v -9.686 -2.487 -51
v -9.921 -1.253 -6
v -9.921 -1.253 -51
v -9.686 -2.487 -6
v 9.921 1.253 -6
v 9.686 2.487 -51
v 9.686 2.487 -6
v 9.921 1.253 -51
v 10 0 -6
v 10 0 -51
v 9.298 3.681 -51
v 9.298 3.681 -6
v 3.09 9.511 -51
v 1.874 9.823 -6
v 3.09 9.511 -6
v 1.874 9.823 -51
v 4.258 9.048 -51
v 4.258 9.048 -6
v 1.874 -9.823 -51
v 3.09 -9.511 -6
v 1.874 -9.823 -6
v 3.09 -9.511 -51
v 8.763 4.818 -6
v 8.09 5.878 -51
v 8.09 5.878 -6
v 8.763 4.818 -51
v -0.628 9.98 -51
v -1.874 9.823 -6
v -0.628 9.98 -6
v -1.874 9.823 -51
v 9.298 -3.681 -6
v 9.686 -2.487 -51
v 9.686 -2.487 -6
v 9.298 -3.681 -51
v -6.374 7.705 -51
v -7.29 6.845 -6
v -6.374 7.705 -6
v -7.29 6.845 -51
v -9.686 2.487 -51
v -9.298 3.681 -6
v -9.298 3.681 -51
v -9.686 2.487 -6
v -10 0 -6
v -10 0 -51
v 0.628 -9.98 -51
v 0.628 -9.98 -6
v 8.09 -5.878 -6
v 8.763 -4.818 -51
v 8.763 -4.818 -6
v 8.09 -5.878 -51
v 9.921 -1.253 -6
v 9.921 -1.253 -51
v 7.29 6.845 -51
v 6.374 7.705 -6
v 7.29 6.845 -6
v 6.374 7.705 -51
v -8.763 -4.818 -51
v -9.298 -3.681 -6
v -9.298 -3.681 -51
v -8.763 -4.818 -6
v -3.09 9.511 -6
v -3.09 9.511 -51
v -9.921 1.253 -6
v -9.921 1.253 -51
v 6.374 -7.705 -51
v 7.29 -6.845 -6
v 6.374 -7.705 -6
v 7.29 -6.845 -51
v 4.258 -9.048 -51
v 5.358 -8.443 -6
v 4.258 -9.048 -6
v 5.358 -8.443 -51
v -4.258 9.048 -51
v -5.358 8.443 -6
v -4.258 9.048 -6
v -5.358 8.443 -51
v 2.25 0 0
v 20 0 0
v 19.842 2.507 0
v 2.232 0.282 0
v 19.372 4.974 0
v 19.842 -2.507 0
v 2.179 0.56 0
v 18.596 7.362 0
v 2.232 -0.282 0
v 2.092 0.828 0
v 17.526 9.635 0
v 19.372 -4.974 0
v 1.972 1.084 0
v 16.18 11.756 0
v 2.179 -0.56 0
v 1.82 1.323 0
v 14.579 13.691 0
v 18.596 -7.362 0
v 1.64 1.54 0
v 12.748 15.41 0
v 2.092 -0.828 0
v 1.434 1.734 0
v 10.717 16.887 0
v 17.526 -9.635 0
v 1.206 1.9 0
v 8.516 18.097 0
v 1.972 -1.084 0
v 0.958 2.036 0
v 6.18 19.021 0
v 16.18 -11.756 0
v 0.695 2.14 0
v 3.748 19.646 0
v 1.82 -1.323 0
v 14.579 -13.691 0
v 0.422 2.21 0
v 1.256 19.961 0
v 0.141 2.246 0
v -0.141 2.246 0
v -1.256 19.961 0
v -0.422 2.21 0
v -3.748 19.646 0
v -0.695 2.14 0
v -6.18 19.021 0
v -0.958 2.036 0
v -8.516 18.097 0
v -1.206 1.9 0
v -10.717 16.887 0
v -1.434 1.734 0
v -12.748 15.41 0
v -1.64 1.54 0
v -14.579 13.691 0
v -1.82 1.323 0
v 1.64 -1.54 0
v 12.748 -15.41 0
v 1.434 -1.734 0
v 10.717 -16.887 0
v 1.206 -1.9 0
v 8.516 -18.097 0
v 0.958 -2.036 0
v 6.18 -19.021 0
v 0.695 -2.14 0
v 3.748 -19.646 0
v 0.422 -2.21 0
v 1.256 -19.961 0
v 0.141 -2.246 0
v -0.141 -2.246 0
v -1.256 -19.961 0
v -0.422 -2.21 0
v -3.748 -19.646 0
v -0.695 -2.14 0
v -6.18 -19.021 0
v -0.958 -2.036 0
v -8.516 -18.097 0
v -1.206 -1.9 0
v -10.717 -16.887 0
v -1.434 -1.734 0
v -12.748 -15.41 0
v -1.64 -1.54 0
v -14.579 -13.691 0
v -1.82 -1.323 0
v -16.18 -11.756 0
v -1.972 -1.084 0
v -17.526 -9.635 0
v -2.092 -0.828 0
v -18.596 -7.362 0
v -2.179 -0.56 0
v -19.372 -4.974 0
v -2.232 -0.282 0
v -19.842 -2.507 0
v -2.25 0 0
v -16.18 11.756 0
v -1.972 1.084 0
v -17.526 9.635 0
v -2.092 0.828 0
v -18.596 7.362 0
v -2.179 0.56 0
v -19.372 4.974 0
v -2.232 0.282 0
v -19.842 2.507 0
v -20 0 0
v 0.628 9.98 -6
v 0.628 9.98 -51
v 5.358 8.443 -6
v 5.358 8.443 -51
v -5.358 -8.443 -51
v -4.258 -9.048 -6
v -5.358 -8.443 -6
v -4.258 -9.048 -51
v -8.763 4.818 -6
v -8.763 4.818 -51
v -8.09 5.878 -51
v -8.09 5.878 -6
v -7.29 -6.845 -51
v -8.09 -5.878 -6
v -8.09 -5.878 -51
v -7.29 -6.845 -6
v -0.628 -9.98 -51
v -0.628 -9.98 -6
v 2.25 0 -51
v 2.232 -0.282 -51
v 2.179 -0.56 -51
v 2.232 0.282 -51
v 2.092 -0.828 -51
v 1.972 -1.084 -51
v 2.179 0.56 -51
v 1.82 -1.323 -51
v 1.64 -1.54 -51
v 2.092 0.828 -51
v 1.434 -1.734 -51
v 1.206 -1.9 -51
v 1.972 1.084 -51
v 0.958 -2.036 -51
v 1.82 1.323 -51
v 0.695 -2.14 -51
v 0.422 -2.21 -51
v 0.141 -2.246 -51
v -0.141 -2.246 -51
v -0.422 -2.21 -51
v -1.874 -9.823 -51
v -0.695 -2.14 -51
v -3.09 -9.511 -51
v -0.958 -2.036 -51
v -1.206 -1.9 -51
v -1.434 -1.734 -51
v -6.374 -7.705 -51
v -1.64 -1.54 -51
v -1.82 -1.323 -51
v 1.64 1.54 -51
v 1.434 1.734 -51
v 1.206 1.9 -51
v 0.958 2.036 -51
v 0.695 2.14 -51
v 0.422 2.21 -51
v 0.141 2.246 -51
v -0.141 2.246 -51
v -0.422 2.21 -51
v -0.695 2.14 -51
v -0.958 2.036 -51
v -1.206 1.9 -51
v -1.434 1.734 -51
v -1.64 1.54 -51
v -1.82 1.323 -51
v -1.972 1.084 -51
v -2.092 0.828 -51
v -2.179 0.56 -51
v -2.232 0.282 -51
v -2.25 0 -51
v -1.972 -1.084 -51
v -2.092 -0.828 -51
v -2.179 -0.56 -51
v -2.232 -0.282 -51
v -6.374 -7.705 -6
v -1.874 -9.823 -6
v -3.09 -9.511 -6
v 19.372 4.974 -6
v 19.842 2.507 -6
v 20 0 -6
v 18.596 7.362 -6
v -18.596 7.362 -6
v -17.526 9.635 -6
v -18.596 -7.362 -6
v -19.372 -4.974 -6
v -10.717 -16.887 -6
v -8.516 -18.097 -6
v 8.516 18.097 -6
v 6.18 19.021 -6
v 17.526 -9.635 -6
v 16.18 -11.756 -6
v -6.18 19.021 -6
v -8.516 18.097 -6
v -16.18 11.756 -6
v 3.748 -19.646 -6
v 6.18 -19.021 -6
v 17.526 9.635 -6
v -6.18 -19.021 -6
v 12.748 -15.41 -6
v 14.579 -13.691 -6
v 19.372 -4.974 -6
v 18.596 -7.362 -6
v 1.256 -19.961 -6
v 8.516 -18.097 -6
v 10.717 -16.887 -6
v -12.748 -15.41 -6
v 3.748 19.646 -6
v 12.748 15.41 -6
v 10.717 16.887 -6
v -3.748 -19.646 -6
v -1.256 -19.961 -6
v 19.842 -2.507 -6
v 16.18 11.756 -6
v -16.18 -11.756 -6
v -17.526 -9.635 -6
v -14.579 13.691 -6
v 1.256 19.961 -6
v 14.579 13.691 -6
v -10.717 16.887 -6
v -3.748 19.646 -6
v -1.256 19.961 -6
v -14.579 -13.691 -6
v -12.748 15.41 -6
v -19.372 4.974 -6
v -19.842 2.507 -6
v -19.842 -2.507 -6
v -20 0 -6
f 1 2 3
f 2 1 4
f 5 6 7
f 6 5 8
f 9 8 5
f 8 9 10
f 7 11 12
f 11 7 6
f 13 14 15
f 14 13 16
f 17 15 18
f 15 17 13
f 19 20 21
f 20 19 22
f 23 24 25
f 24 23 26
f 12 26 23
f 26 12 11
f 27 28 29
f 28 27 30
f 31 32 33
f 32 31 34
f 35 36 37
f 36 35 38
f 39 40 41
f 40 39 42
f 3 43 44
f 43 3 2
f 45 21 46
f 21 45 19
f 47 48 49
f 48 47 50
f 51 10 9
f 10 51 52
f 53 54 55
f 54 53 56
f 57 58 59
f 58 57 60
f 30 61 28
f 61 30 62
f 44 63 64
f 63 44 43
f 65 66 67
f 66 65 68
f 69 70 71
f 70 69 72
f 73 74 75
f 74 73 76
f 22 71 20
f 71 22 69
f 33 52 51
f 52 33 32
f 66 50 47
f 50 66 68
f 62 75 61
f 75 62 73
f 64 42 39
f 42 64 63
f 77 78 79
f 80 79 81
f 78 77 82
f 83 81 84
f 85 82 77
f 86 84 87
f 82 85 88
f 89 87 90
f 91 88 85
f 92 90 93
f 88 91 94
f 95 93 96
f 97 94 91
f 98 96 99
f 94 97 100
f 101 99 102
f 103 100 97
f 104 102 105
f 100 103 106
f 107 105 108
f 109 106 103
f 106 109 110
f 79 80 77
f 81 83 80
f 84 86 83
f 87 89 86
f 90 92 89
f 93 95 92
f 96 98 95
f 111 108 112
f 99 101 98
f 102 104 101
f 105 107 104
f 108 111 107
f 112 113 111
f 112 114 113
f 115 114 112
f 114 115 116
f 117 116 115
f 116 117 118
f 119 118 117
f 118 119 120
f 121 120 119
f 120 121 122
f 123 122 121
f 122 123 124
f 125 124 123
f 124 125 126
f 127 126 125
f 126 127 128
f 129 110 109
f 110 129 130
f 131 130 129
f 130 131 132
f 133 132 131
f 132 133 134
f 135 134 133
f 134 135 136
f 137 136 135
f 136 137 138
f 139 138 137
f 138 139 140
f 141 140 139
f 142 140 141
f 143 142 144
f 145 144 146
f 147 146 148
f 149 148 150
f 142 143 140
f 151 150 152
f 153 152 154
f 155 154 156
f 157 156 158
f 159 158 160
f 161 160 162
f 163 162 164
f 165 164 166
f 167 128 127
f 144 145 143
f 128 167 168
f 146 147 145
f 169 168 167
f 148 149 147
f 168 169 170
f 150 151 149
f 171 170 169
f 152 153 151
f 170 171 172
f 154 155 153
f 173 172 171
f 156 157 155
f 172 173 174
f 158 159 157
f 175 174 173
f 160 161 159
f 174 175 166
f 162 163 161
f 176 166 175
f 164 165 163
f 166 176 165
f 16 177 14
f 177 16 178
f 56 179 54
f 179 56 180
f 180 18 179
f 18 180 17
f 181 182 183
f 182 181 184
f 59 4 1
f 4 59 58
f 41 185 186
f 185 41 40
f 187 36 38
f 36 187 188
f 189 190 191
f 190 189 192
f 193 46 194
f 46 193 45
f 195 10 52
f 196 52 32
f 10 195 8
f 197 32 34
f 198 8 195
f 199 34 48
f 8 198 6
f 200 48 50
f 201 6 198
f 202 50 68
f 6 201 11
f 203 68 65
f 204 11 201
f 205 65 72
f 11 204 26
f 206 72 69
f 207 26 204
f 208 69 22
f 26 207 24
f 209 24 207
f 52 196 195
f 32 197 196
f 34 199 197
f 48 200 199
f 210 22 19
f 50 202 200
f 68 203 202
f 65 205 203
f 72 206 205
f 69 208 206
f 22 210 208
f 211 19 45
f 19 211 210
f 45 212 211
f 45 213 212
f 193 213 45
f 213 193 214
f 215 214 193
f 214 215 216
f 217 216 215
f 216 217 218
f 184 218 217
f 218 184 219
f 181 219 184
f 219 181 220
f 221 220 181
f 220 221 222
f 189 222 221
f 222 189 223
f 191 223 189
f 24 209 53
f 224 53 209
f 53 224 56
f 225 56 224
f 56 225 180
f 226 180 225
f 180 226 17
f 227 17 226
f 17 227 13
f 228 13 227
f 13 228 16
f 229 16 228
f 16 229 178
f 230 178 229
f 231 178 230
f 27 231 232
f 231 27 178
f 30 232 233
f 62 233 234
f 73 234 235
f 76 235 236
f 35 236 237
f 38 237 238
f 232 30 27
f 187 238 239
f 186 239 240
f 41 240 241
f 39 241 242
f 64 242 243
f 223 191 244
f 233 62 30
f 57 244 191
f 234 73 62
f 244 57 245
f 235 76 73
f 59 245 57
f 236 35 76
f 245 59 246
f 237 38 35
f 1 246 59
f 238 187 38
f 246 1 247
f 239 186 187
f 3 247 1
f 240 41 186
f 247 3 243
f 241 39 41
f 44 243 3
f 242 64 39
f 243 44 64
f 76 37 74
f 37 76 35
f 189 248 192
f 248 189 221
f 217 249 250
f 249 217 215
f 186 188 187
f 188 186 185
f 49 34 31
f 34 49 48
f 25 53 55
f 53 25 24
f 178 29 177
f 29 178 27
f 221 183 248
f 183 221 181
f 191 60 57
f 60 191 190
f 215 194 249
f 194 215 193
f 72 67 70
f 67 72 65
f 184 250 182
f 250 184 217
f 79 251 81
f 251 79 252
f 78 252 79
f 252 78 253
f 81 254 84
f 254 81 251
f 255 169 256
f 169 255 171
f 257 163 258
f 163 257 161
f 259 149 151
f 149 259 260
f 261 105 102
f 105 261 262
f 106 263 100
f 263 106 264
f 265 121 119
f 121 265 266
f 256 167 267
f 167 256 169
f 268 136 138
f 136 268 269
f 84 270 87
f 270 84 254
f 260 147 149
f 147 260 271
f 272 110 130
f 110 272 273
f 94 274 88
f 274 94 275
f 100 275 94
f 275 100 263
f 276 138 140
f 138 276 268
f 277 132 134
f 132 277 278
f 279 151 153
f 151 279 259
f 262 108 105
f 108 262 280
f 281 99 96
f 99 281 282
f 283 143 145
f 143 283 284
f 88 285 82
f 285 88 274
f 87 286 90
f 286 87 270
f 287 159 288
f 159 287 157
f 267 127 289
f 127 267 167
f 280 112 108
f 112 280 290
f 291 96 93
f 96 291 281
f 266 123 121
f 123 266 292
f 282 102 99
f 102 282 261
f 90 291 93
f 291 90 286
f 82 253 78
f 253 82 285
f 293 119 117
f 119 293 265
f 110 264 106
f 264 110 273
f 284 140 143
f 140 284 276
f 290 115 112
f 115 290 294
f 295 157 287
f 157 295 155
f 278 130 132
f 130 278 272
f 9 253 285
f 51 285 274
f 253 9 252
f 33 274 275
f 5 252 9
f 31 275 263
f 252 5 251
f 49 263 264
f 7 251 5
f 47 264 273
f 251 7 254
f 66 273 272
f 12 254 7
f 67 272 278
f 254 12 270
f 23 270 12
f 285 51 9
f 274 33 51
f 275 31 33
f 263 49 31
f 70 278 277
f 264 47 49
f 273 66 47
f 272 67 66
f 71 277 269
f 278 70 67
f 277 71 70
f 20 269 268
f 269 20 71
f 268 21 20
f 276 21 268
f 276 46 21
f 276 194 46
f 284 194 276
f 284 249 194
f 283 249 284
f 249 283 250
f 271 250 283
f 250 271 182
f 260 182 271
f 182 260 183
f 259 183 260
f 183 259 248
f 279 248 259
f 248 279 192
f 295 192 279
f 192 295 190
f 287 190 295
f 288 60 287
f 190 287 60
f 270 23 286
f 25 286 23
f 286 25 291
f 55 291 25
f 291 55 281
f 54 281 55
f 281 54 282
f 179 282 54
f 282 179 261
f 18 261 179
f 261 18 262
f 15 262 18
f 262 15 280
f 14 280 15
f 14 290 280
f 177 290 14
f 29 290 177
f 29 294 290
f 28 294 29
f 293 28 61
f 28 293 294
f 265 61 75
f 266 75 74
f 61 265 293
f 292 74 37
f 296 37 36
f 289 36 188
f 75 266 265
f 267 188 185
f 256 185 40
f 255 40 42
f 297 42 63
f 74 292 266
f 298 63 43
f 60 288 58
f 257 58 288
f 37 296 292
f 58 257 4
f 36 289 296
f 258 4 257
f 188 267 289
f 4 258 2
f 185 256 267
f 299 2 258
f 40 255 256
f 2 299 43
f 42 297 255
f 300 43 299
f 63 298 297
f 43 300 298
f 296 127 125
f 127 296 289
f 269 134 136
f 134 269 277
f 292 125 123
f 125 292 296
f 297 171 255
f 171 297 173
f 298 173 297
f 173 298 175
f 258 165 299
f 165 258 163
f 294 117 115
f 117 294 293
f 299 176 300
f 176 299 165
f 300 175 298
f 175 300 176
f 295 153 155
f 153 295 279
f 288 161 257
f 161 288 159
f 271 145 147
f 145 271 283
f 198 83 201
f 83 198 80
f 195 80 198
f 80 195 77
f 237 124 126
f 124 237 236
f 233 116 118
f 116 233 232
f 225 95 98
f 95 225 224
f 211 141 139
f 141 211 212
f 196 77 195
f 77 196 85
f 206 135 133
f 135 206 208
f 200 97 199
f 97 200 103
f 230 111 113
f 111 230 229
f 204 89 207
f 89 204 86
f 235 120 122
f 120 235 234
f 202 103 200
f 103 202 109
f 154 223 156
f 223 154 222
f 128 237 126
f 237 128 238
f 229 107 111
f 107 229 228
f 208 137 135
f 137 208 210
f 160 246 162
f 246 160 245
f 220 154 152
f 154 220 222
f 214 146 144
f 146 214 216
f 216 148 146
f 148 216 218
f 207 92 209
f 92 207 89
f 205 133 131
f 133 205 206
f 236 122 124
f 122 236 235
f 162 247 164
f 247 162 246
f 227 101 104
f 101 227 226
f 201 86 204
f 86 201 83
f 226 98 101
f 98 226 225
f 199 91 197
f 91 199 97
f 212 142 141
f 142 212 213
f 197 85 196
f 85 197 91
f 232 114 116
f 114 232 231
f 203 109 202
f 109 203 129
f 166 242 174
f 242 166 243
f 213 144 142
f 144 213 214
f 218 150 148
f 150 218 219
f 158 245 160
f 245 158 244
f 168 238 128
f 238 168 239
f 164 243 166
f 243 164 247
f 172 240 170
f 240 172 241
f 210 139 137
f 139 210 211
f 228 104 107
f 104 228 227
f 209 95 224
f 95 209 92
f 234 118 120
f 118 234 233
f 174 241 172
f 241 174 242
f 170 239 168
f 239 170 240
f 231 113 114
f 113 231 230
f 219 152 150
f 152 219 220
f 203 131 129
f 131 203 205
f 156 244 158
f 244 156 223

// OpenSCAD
$fn = 50;


difference() {
	union() {
		translate(v = [0, 0, -51.0000000000]) {
			cylinder(h = 51, r = 10.0000000000);
		}
		translate(v = [0, 0, -6.0000000000]) {
			cylinder(h = 6, r = 20.0000000000);
		}
	}
	union() {
		#translate(v = [0, 0, -51]) {
			cylinder(h = 51, r = 2.2500000000);
		}
	}
}
